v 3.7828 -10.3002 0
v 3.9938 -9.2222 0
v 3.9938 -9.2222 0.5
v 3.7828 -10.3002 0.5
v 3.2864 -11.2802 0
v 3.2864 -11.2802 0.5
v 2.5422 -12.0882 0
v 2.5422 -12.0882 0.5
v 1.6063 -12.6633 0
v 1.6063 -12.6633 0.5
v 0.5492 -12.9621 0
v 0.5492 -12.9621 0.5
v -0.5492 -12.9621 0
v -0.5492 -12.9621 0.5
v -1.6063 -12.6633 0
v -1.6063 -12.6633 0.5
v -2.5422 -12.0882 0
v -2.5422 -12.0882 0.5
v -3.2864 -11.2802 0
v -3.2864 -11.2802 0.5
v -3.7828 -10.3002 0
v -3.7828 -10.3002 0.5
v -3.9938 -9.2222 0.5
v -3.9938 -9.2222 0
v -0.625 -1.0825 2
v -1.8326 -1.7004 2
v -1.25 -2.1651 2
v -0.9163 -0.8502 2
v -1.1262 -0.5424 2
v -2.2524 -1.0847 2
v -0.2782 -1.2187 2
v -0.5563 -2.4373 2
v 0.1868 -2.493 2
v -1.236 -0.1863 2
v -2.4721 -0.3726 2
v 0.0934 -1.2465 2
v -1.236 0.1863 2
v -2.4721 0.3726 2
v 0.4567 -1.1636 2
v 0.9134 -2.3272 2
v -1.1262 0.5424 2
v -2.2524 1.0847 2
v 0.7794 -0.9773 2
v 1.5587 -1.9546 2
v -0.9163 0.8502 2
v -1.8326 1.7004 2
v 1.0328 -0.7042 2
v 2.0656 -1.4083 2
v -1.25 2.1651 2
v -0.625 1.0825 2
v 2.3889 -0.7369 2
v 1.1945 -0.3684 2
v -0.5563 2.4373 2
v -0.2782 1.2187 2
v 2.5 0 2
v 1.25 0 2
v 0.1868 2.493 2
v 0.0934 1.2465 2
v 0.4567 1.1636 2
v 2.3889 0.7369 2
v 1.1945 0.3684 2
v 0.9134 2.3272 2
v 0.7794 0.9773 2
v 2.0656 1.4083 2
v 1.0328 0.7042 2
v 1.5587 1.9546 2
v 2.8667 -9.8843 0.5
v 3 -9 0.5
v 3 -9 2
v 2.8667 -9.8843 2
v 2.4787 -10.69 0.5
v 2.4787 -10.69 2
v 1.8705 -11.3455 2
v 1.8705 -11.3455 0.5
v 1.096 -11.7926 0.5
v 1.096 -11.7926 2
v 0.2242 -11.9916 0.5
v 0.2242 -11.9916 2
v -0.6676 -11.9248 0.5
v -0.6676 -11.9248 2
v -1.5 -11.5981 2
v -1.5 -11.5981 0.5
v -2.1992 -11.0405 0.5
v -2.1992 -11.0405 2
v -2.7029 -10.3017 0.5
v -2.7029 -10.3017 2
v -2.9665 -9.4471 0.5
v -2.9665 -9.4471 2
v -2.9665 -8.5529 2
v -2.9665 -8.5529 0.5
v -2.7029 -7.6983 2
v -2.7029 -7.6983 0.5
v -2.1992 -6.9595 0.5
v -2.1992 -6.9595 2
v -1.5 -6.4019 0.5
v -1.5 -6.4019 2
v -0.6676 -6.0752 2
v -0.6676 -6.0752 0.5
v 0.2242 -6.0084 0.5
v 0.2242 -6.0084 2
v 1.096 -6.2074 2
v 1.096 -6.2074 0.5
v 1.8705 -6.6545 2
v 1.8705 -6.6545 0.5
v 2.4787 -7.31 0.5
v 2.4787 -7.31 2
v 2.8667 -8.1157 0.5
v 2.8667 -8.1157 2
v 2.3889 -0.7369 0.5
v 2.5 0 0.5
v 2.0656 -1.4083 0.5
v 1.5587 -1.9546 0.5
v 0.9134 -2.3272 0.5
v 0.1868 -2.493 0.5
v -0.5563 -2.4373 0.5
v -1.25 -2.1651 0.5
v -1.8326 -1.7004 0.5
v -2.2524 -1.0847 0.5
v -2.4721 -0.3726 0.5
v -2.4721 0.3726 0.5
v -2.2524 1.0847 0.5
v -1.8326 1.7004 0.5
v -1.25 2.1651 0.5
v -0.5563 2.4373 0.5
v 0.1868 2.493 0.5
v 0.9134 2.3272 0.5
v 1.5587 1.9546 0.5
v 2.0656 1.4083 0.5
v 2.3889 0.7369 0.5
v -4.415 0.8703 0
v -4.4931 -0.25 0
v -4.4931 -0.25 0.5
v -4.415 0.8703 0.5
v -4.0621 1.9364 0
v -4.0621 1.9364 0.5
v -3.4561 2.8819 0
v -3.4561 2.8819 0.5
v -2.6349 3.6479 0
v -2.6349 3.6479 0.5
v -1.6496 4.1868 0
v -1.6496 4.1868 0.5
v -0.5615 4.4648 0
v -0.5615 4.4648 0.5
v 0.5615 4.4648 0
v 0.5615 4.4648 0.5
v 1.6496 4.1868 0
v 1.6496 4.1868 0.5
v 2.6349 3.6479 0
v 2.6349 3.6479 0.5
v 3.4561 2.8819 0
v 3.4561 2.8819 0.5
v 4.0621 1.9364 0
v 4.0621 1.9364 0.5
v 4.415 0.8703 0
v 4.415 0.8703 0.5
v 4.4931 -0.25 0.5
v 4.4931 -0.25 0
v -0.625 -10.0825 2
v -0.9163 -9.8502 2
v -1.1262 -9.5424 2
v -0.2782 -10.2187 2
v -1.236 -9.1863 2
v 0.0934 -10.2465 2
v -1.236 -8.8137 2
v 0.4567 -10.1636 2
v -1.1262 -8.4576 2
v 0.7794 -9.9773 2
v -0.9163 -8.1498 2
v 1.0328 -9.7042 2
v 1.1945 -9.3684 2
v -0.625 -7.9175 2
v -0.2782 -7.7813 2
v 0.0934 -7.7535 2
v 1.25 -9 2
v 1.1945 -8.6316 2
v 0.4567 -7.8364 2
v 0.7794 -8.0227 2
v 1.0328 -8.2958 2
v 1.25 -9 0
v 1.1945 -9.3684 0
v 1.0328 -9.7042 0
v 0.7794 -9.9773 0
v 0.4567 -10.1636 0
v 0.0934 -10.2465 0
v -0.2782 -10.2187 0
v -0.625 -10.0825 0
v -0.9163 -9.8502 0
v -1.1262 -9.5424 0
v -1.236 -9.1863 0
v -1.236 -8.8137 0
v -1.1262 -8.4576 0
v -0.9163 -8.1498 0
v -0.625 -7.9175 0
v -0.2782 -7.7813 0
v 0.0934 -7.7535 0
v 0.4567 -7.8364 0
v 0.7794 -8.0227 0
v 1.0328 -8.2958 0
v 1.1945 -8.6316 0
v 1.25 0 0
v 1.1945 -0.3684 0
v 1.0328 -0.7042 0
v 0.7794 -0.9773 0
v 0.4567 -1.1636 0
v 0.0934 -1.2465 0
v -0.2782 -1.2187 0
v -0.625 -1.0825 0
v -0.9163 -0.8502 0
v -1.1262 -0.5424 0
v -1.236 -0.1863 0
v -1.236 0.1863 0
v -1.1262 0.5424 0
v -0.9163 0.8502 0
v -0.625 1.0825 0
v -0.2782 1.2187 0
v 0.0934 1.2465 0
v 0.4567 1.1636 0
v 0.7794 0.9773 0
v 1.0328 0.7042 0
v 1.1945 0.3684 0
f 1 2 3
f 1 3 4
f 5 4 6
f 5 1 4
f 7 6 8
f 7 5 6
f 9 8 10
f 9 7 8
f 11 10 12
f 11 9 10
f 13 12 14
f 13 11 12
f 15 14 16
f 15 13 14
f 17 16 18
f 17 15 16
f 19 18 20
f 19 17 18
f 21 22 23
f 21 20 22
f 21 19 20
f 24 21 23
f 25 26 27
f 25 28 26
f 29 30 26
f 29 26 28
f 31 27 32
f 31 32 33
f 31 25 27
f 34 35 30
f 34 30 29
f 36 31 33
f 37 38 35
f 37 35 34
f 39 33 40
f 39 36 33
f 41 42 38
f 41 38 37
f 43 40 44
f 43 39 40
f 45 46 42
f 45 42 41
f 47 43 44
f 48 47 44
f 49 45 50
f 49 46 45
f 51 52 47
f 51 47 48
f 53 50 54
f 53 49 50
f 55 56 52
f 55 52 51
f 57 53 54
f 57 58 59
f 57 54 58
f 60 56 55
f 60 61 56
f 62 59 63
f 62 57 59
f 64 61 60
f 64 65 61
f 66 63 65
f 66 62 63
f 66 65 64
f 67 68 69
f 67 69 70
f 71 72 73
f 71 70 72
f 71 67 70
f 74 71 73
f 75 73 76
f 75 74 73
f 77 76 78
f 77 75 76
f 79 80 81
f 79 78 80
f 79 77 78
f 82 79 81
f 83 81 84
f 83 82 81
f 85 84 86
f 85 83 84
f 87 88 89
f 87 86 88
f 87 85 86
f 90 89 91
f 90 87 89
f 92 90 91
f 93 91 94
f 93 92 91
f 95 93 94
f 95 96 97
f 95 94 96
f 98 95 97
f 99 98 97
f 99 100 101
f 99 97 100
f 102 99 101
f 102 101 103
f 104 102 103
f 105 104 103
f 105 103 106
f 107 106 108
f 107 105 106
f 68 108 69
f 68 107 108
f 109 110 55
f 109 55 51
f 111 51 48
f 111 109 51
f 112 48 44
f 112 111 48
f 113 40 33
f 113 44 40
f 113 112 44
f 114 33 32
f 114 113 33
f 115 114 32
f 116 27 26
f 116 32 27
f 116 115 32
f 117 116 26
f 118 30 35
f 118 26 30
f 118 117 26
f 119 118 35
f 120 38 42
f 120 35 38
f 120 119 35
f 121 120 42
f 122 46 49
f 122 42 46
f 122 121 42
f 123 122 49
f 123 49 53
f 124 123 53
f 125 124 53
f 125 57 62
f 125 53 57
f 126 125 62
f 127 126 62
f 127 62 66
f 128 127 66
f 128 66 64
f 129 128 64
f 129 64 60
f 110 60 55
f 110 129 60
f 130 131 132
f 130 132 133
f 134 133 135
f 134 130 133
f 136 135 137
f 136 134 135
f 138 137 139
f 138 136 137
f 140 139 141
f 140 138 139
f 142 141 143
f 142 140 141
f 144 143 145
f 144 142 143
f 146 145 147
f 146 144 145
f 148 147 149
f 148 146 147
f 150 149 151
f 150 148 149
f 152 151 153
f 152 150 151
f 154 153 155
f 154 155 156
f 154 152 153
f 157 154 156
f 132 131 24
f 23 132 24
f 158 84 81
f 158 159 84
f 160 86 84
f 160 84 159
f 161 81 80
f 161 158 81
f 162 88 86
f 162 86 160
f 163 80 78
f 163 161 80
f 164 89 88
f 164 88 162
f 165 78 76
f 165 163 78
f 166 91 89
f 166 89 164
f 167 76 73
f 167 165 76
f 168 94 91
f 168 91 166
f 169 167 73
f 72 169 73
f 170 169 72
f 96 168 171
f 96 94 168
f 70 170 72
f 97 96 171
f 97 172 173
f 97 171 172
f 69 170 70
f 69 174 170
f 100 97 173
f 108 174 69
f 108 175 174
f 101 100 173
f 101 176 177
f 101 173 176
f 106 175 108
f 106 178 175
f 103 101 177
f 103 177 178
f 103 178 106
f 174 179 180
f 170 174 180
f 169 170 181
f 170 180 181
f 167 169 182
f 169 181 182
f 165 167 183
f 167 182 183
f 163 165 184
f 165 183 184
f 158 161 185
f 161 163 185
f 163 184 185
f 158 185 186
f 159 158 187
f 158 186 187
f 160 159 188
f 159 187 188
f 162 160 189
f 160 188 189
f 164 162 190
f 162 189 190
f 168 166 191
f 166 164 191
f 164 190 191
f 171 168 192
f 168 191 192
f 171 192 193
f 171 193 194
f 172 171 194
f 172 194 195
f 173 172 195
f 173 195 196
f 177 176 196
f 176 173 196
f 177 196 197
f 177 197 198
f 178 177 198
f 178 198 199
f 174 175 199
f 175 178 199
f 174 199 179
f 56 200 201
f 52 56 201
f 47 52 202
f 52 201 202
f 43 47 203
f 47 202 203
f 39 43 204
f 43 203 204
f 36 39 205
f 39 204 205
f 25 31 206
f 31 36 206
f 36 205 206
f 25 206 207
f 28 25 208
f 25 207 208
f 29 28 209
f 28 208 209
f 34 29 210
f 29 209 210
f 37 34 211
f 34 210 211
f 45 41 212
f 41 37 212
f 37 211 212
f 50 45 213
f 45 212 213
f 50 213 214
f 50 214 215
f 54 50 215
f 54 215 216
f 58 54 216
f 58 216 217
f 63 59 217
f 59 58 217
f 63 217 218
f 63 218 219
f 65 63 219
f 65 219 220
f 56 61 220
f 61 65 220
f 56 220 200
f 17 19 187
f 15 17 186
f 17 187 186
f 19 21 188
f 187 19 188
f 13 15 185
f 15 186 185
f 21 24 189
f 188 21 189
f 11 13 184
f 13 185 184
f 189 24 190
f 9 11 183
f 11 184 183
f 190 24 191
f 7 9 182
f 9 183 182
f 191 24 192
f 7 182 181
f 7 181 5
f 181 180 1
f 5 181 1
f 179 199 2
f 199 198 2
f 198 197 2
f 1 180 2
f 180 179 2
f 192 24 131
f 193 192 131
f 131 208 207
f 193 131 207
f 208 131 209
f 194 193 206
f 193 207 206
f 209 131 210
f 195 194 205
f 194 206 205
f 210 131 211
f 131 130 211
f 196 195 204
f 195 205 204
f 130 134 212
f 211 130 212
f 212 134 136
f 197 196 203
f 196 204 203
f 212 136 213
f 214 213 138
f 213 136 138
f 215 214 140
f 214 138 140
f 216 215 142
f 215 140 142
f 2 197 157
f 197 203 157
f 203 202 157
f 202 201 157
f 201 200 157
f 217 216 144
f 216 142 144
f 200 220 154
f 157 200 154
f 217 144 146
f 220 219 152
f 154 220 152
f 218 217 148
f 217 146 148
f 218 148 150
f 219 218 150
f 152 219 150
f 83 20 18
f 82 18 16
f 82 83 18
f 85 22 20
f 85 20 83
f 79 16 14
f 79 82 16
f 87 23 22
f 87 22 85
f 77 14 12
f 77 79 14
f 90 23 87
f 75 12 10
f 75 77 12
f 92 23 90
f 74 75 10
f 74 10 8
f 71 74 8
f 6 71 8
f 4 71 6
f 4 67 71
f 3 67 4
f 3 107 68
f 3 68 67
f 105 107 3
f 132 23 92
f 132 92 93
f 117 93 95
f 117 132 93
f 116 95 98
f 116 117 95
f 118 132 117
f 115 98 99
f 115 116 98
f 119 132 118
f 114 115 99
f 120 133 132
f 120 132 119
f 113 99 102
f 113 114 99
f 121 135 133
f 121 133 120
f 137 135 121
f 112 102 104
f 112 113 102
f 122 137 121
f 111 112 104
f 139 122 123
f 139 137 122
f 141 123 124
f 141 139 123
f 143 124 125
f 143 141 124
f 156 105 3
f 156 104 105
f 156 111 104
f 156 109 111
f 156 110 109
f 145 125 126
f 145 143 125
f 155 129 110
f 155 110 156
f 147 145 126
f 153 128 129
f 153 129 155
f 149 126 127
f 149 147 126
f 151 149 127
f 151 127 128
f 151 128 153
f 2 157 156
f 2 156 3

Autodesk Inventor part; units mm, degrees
ref_plane "YZ Plane" through (0, 0, 0) normal (1, 0, 0) x (0, 1, 0)
ref_plane "XZ Plane" through (0, 0, 0) normal (0, 1, 0) x (-1, 0, 0)
ref_plane "XY Plane" through (0, 0, 0) normal (0, 0, 1) x (1, 0, 0)
sketch "Sketch1" plane through (0, 0, 0) normal (0, 0, 1) x (1, 0, 0)
  circle A0 centre (0, 0) radius 2.5
  circle A1 centre (0, 0) radius 4.5
  circle A2 centre (0, -9) radius 1.25
  circle A3 centre (0, -9) radius 3
  circle A4 centre (0, -9) radius 4
  circle A5 centre (0, 0) radius 1.25
  line L0 (-4.4931, -0.25) -> (-3.9938, -9.2222)
  line L1 (4.4931, -0.25) -> (3.9938, -9.2222)
  line L2 (0, 0) -> (0, -19.0302) construction
  point P0 (66.1895, -52.0583)
  point P1 (148.6808, -39.1685)
  point P2 (99.1548, -7.9801)
  point P3 (101.772, -8.3287)
  point P4 (96.5376, -8.3287)
  dimension "d8" = 9
  dimension "d13" = 5
  dimension "d25" = 2.5
  dimension "d26" = 6
  dimension "d27" = 8
  dimension "d28" = 2.5
  dimension "d29" = 9
extrude "Extrusion1" add sketch "Sketch1" along normal blind 0.5 contours A1 | A1 L1 A4 L0 | A4
extrude "Extrusion2" add sketch "Sketch1" along normal blind 2 contours A0 | A3
properties part number "ヘッケン抑え"
